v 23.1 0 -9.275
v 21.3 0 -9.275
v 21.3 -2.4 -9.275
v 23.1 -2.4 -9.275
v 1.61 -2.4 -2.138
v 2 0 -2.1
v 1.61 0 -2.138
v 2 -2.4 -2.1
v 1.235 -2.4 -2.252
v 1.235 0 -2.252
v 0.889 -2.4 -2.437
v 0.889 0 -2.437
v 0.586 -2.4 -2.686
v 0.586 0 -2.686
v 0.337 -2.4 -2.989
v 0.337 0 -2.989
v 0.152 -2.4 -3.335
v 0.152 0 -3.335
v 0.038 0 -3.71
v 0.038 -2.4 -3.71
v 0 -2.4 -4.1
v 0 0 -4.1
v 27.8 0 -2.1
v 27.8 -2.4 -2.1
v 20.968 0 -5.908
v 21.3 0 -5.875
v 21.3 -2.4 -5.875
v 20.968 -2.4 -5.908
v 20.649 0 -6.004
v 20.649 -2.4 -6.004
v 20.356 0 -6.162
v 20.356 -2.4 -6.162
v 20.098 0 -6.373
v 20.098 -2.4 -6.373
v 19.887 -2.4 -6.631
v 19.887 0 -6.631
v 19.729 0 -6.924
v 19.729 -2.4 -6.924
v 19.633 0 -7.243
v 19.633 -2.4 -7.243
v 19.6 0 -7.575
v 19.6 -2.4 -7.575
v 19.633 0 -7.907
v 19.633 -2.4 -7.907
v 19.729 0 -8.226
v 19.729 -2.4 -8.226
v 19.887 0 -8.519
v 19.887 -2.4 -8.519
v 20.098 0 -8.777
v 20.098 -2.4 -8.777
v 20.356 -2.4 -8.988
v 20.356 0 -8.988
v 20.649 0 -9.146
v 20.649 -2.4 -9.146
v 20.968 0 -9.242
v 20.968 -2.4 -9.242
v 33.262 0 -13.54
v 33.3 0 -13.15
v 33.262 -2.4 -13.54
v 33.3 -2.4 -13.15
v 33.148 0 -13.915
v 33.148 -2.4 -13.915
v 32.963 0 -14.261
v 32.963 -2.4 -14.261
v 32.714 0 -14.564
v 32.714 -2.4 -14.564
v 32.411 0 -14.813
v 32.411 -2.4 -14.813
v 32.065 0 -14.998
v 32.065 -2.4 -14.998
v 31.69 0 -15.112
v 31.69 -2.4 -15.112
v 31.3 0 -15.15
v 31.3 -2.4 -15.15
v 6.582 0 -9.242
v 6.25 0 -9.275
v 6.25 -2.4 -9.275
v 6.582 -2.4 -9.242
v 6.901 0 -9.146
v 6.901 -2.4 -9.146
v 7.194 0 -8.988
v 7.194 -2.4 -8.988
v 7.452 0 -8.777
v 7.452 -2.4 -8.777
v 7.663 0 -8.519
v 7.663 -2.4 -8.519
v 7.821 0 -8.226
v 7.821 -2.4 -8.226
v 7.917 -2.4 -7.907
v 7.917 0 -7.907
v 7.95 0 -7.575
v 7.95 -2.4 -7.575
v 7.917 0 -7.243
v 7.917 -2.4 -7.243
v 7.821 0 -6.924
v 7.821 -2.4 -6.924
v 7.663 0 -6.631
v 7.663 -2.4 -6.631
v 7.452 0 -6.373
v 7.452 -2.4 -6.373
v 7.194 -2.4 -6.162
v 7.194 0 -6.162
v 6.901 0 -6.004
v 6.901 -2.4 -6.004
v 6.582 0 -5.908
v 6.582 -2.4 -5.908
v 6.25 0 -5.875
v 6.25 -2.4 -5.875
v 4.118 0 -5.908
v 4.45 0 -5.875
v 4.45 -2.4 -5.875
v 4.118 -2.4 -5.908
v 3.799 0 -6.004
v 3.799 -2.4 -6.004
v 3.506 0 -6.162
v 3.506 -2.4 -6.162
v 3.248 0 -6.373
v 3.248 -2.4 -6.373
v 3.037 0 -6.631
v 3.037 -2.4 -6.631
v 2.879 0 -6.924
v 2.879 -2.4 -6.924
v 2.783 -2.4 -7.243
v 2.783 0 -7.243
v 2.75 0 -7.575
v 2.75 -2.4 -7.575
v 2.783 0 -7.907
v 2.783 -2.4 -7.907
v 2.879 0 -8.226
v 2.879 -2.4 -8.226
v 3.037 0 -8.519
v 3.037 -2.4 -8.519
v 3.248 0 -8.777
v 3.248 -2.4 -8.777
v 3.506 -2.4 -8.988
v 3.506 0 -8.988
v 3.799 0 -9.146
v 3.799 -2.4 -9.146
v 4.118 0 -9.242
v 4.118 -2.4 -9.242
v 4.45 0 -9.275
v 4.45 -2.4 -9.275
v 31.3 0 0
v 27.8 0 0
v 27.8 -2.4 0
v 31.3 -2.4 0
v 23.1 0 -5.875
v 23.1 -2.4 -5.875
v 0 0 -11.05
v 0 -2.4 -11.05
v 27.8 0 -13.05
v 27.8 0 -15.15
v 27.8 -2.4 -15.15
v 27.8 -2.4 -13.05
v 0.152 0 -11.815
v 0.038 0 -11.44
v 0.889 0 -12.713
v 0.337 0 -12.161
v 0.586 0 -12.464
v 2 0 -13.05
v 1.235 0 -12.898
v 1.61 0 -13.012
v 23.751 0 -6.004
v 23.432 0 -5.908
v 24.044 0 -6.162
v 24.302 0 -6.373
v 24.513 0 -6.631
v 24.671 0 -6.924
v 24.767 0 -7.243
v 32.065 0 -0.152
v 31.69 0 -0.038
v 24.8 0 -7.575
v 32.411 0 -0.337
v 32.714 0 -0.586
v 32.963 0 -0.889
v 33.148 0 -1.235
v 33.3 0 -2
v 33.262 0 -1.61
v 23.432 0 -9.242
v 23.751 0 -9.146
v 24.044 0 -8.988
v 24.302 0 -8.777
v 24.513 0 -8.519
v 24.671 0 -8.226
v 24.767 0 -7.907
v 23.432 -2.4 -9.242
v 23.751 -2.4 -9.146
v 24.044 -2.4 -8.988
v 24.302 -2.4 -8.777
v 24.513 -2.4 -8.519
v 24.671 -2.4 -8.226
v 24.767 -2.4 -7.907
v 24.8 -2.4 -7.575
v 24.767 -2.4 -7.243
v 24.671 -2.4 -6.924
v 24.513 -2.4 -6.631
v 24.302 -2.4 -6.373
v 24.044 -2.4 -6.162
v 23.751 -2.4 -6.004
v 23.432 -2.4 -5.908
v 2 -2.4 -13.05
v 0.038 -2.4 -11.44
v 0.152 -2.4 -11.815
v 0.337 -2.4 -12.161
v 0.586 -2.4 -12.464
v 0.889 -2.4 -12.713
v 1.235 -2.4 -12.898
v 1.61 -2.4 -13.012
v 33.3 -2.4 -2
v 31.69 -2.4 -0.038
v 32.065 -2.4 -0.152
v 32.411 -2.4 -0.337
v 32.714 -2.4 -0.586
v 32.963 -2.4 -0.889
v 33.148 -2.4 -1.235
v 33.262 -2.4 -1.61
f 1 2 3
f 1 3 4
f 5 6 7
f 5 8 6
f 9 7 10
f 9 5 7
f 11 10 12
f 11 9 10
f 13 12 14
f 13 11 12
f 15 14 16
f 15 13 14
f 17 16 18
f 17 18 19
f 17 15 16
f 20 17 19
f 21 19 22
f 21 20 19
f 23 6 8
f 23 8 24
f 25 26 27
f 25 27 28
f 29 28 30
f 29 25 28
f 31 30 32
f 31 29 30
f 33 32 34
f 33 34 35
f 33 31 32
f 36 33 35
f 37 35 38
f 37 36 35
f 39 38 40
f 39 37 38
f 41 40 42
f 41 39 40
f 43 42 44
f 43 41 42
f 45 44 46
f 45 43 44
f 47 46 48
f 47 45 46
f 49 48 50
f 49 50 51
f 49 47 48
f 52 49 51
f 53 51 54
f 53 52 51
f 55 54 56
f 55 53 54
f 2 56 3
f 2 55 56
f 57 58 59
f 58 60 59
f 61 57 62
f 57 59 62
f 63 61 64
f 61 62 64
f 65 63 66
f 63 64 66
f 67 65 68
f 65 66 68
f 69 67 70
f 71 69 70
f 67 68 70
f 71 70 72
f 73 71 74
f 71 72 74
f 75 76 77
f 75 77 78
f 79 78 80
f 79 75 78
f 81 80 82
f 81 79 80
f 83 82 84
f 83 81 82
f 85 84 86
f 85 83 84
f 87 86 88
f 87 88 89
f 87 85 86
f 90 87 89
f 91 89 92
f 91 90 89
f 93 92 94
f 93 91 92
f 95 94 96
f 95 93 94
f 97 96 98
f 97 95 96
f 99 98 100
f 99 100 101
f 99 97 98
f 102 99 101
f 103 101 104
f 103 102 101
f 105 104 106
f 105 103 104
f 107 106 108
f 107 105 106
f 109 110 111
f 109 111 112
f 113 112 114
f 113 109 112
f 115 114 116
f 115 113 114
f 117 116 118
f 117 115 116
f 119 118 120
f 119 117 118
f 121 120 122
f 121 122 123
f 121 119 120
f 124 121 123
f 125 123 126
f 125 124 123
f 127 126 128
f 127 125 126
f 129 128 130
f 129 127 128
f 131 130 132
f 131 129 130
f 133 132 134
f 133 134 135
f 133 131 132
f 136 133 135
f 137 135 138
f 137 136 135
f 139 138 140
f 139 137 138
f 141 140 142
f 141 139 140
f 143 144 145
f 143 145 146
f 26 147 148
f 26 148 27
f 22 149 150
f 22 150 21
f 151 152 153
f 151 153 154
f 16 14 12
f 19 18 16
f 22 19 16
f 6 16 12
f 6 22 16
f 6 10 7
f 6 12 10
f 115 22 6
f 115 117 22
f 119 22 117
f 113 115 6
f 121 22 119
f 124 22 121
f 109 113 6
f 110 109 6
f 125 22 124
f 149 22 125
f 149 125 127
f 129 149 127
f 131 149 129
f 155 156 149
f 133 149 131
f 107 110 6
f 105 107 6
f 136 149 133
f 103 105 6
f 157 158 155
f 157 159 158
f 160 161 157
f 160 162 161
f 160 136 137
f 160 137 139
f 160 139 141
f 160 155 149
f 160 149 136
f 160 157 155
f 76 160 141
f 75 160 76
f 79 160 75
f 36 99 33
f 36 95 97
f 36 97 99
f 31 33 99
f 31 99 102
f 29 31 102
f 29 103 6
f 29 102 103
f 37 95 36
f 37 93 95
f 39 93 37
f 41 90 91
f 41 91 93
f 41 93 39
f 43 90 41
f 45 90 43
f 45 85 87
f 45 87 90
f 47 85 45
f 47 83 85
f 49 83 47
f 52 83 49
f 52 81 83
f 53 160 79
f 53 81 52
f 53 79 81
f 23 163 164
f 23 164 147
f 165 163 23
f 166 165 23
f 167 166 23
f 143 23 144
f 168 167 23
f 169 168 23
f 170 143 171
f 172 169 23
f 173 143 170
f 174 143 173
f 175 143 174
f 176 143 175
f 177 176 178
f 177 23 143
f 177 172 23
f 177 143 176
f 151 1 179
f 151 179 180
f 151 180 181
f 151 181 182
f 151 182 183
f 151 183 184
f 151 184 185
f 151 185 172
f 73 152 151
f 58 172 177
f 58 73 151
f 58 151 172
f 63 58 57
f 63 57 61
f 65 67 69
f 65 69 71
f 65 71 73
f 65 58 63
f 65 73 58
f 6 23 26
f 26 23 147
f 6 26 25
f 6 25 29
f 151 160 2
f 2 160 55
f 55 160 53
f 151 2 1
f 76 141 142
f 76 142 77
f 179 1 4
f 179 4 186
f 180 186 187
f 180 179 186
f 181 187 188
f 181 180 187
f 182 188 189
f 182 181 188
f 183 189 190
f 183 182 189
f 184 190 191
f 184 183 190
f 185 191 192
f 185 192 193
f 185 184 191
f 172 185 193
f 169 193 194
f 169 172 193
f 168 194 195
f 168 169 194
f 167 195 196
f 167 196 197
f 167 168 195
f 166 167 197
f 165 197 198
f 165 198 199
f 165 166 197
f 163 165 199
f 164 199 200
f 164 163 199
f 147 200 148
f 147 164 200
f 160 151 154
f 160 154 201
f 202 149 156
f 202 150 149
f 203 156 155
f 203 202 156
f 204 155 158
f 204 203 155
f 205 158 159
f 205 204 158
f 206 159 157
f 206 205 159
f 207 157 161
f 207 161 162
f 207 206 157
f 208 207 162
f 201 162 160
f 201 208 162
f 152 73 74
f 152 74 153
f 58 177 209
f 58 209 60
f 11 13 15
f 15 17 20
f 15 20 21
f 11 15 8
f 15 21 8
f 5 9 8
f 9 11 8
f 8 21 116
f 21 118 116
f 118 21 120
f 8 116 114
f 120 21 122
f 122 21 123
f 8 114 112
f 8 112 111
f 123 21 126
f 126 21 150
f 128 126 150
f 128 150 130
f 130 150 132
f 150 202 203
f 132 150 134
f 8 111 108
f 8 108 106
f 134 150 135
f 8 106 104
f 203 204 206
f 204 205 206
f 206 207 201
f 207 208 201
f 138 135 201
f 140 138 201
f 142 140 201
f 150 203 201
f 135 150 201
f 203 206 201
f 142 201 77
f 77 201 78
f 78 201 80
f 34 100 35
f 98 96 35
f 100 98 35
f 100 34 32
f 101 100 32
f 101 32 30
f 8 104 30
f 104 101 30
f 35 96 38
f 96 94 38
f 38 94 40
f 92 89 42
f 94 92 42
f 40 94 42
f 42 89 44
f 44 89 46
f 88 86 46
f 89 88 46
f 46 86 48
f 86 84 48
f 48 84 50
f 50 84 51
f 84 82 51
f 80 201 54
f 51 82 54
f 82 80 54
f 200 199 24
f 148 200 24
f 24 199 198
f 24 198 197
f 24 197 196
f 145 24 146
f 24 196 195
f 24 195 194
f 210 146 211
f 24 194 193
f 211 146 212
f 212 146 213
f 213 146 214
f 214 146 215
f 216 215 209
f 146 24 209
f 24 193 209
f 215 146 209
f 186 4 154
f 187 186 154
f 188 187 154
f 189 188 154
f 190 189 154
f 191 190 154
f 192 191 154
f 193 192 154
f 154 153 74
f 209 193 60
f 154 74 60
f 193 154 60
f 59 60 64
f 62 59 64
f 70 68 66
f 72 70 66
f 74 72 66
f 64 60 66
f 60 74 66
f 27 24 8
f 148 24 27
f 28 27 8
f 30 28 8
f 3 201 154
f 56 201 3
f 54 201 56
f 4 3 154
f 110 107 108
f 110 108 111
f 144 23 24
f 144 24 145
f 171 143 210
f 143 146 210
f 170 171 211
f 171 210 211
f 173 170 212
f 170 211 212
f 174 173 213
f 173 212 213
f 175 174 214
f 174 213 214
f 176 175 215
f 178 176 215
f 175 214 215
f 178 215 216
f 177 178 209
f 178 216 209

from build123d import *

# Parameters (mm, degrees)
BOSS_EXTRUDE1_DEPTH = 2.4
FILLET1_R           = 2


with BuildPart() as part:
    # Sketch1 → Boss-Extrude1 (new body)
    with BuildSketch(Plane(origin=(0, 0, 0), x_dir=(1, 0, 0), z_dir=(0, 1, 0))):
        Polygon((27.8, 2.1), (27.8, 0), (33.3, 0), (33.3, 15.15), (27.8, 15.15), (27.8, 13.05), (0, 13.05), (0, 2.1), align=None)
        with BuildLine():
            ThreePointArc((4.45, 5.875), (2.75, 7.575), (4.45, 9.275))
            Line((4.45, 9.275), (6.25, 9.275))
            ThreePointArc((6.25, 9.275), (7.95, 7.575), (6.25, 5.875))
            Line((6.25, 5.875), (4.45, 5.875))
        make_face(mode=Mode.SUBTRACT)
        with BuildLine():
            ThreePointArc((23.1, 9.275), (24.8, 7.575), (23.1, 5.875))
            Line((23.1, 5.875), (21.3, 5.875))
            ThreePointArc((21.3, 5.875), (19.6, 7.575), (21.3, 9.275))
            Line((21.3, 9.275), (23.1, 9.275))
        make_face(mode=Mode.SUBTRACT)
    extrude(amount=-BOSS_EXTRUDE1_DEPTH)

    # Fillet1
    fillet1_edges = [part.edges().sort_by_distance(p)[0] for p in [
        (33.3, -1.2, -15.15),
        (33.3, -1.2, 0),
        (0, -1.2, -2.1),
        (0, -1.2, -13.05),
    ]]
    fillet(fillet1_edges, radius=FILLET1_R)


solid = part.part
